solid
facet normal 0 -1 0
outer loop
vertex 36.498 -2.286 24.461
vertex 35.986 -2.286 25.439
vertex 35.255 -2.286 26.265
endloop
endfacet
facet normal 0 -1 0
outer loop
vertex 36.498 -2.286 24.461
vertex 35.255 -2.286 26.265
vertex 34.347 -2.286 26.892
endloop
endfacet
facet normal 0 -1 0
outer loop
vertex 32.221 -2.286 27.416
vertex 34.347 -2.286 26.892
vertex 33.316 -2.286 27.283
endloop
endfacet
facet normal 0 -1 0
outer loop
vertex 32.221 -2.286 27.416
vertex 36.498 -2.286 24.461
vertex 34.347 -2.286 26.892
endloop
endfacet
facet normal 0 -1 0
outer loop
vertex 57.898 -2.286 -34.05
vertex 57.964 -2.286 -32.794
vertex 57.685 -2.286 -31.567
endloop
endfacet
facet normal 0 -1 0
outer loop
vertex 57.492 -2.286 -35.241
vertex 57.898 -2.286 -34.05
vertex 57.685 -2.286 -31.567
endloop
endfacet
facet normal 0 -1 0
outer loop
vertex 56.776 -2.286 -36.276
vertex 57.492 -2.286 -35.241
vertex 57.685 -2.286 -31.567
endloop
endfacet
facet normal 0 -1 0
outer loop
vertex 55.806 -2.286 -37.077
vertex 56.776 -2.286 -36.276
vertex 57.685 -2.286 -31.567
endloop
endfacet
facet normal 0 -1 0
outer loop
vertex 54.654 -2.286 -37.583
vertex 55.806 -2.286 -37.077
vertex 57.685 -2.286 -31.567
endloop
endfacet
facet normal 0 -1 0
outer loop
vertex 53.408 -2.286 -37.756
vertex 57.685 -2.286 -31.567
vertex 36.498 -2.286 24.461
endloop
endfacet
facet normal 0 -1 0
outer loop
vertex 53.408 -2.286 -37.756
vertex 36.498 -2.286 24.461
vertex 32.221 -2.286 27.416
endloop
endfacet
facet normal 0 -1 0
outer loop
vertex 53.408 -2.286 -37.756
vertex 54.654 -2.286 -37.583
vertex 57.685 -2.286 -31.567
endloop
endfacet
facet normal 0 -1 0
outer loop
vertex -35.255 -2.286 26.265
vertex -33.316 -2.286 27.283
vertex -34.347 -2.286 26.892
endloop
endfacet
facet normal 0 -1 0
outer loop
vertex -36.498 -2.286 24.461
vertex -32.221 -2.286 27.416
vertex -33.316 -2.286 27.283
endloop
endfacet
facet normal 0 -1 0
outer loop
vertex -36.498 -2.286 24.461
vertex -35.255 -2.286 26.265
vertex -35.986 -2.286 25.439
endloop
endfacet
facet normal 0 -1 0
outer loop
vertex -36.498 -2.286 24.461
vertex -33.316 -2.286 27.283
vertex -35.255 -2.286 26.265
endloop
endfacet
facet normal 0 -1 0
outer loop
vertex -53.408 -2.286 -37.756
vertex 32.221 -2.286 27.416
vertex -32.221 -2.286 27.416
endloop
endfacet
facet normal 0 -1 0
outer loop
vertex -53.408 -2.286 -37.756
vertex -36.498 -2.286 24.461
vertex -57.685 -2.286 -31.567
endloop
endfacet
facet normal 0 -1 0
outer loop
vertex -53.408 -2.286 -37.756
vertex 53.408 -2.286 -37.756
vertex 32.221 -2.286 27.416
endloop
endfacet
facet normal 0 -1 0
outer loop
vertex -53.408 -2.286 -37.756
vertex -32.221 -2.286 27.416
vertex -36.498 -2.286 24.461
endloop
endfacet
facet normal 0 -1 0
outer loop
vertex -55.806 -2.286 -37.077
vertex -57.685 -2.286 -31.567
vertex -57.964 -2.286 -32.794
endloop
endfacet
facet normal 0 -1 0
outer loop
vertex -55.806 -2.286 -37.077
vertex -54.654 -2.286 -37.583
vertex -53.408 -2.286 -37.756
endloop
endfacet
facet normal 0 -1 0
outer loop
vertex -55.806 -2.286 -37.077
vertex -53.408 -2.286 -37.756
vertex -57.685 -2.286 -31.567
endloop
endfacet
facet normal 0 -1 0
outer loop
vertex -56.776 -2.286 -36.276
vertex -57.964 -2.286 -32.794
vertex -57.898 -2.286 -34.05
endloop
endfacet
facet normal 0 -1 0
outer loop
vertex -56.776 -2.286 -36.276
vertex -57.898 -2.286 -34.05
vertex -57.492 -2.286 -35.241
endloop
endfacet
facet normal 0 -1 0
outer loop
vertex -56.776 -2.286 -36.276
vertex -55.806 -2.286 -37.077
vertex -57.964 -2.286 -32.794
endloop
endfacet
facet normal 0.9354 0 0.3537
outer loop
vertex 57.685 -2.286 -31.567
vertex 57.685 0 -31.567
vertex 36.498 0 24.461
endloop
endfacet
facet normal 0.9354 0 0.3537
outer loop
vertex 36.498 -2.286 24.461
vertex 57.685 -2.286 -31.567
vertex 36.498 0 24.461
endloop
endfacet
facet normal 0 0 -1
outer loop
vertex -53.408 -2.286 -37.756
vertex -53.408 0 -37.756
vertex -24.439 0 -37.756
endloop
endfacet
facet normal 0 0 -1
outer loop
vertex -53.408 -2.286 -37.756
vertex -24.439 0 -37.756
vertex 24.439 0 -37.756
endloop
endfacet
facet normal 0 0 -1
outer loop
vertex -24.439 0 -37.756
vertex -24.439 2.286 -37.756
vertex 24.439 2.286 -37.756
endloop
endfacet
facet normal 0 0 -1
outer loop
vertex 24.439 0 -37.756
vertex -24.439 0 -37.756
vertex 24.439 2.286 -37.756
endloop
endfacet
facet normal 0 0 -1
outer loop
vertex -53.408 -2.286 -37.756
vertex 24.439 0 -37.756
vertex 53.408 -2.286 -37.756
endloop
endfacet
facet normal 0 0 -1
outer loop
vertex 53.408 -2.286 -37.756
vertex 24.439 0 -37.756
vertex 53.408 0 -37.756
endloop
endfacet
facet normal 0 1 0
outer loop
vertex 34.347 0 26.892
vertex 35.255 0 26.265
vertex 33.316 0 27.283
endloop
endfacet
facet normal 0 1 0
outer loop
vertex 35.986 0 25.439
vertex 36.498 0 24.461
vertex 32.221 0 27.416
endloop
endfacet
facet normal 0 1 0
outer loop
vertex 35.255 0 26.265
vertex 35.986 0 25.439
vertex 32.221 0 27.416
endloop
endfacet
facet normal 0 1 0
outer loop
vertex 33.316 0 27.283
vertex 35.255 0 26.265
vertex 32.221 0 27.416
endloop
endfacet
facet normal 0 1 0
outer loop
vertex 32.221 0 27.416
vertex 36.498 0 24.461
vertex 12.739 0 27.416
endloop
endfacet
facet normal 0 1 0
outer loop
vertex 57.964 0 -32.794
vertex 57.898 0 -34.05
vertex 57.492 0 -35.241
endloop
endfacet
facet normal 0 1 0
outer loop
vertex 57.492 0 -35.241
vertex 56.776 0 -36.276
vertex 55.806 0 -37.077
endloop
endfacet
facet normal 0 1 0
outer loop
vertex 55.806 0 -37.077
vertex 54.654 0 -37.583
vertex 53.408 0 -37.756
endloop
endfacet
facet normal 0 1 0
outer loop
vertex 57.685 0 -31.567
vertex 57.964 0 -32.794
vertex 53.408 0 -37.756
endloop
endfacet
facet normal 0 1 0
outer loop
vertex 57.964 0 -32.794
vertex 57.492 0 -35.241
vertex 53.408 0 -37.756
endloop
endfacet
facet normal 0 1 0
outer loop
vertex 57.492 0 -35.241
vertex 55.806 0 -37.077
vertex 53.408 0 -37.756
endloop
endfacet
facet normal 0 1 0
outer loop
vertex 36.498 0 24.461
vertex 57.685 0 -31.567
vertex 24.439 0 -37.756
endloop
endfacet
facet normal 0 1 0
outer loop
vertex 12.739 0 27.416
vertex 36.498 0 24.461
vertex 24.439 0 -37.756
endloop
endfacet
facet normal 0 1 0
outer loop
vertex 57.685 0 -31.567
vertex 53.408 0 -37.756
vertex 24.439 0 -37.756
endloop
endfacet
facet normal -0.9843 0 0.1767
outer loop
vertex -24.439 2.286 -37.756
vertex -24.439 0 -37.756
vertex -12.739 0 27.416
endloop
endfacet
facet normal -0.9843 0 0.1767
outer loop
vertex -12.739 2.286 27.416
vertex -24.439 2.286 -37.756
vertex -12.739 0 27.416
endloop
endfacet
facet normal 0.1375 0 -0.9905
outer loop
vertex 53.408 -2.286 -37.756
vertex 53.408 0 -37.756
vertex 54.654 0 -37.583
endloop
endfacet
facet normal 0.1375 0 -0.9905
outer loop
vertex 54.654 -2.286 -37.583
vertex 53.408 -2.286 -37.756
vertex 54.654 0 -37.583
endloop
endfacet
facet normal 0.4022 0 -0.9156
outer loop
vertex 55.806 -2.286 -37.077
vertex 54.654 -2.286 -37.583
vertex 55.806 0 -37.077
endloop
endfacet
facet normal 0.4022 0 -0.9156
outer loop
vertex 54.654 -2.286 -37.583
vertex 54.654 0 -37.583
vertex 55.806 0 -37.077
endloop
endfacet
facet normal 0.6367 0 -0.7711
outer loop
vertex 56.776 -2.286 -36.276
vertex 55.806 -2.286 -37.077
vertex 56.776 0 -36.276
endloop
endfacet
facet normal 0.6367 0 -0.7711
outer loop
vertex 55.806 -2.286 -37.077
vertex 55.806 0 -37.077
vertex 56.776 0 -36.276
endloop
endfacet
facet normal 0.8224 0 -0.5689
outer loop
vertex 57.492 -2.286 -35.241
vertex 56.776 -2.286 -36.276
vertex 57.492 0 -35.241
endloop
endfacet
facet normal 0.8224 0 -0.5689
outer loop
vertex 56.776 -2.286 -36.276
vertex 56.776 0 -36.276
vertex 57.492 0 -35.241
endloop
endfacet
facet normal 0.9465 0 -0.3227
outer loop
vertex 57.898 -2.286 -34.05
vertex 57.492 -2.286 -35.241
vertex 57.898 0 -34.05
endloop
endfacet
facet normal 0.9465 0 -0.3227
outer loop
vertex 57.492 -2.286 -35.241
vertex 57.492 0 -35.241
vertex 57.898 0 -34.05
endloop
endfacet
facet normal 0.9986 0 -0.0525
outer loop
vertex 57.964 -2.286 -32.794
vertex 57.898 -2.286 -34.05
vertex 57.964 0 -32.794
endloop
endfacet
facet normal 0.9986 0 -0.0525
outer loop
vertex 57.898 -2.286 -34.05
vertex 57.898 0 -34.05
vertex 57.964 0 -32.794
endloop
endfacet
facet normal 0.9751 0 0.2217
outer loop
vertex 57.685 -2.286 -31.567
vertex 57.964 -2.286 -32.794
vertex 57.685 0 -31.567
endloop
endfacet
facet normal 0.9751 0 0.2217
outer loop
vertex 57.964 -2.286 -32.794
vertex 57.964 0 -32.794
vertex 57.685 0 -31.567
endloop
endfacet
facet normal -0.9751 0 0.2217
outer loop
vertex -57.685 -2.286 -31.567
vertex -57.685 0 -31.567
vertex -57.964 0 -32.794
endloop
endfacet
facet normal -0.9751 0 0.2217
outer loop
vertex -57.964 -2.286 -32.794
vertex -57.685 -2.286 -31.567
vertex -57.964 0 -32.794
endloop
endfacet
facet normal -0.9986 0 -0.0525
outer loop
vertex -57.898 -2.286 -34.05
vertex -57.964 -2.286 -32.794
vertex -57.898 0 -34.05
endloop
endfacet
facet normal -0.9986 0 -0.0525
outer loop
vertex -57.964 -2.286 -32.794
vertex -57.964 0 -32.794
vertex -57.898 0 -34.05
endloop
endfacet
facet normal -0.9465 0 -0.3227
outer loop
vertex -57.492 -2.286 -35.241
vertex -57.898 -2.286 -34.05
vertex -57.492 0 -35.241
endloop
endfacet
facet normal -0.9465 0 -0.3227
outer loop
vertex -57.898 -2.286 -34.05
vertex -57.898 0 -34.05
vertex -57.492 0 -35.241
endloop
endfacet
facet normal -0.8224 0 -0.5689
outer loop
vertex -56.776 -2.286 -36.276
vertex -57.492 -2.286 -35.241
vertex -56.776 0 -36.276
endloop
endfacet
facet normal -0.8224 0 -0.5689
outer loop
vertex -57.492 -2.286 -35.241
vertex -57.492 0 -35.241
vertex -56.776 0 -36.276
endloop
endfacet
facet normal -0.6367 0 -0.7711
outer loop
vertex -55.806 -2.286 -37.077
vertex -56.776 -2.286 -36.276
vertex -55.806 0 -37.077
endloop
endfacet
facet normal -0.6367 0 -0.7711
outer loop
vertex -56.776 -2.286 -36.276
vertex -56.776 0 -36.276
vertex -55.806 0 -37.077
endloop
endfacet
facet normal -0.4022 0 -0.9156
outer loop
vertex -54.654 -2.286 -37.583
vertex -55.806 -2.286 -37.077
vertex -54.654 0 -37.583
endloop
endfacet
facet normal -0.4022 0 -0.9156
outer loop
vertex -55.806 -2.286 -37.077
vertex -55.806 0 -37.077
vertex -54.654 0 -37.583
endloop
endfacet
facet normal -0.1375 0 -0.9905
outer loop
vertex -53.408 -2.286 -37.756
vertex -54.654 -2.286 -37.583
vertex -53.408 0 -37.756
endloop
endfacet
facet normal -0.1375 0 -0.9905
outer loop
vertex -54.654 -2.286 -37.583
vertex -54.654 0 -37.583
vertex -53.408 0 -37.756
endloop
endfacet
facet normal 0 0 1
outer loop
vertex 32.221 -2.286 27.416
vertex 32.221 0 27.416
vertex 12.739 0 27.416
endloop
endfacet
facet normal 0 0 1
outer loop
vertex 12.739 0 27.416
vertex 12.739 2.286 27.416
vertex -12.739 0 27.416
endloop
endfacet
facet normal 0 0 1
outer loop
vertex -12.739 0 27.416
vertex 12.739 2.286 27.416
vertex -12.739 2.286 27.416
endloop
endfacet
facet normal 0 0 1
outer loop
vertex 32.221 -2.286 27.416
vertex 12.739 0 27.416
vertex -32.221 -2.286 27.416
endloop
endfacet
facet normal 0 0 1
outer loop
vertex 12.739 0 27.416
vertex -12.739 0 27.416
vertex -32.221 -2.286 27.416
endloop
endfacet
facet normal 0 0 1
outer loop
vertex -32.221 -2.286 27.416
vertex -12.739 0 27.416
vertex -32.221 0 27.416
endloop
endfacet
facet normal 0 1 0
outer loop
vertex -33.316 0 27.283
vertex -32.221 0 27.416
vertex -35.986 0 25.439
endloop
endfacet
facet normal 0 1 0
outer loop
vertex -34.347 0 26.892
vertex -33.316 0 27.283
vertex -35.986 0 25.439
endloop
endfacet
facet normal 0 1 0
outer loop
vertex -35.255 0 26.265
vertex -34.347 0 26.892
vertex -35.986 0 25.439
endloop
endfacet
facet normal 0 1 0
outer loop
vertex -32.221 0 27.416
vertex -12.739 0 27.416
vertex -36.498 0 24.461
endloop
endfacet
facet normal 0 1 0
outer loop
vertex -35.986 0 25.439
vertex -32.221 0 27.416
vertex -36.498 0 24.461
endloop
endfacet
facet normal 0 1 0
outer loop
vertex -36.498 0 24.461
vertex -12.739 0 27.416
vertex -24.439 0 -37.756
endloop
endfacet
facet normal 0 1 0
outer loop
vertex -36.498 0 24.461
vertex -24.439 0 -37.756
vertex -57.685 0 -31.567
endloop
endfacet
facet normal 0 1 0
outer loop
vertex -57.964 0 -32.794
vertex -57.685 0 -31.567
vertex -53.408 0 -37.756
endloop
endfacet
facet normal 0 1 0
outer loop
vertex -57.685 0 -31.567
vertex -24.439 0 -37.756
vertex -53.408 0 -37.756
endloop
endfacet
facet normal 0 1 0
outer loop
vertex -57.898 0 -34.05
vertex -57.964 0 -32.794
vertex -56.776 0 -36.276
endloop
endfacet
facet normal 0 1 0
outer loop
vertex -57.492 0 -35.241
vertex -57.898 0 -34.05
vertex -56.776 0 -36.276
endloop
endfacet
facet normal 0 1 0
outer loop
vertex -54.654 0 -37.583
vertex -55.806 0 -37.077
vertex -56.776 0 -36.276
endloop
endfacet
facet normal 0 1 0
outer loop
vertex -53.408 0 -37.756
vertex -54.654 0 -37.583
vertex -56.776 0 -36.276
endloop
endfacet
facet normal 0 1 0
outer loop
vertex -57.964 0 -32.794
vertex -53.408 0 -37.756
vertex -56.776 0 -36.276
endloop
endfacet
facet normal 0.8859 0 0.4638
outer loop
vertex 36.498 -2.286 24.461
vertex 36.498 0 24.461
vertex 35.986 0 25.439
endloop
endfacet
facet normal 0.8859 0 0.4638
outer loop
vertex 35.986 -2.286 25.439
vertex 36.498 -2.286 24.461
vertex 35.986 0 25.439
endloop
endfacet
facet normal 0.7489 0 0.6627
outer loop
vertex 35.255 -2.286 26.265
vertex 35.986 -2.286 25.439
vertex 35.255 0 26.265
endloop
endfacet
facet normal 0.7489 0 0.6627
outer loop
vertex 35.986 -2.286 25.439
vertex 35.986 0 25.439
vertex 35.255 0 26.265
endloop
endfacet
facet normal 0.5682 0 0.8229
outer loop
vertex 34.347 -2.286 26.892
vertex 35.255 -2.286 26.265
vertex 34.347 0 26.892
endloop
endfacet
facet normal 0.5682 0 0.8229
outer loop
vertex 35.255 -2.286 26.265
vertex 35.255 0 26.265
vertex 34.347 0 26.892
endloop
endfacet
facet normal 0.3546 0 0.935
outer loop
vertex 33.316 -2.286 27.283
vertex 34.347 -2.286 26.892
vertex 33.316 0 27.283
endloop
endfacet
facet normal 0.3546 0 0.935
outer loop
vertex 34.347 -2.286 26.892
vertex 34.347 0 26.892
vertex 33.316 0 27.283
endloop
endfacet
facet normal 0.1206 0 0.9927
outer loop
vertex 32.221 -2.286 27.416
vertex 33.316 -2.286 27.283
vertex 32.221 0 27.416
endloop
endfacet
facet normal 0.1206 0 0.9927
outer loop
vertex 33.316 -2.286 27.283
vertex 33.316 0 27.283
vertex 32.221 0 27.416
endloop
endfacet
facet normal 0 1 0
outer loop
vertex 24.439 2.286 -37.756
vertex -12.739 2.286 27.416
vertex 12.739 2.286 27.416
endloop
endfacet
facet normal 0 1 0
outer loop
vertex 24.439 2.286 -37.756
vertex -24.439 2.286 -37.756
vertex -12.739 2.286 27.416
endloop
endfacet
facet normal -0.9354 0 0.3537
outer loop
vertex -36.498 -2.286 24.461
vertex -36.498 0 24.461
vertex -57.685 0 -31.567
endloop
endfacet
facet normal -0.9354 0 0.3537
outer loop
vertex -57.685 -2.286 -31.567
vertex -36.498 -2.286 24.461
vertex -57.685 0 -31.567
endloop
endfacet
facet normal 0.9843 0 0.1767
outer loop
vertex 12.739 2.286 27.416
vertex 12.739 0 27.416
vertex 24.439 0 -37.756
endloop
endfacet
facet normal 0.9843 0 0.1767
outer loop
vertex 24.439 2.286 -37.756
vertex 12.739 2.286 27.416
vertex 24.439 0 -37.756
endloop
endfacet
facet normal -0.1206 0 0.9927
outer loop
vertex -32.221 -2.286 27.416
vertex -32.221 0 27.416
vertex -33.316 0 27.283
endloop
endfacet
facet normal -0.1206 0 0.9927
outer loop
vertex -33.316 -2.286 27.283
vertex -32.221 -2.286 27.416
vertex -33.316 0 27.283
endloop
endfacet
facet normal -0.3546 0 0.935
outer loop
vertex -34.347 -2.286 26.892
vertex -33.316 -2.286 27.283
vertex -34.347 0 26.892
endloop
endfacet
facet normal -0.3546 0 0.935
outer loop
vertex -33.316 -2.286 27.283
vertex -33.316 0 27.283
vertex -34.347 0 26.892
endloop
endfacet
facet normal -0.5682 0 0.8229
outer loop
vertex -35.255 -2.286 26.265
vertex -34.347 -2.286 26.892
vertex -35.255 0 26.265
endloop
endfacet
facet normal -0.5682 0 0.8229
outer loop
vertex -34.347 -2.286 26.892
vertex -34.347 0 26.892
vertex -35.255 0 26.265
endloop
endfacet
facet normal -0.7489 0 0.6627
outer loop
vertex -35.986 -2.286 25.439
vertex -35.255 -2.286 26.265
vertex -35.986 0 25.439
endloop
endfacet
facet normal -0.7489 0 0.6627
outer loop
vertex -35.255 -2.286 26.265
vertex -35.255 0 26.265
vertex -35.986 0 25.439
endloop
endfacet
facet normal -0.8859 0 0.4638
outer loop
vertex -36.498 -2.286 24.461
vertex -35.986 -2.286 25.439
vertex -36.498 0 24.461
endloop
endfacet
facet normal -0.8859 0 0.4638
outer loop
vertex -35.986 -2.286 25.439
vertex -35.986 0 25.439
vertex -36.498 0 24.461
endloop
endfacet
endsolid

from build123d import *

# Parameters (mm, degrees)
EXTRUDE1_DEPTH = 2.286
EXTRUDE2_DEPTH = 2.286


with BuildPart() as part:
    # Sketch1 → Extrude1 (new body)
    with BuildSketch(Plane(origin=(0, 0, 0), x_dir=(1, 0, 0), z_dir=(0, 1, 0))):
        with BuildLine():
            Line((-53.408275127, 37.75591133), (53.408275127, 37.75591133))
            ThreePointArc((53.408275127, 37.75591133), (57.169709098, 35.782910846), (57.684725289, 31.566766311))
            Line((57.684725289, 31.566766311), (36.497605157, -24.461395817))
            ThreePointArc((36.497605157, -24.461395817), (34.820154512, -26.605684768), (32.221154995, -27.416250797))
            Line((32.221154995, -27.416250797), (-32.221154995, -27.416250797))
            ThreePointArc((-32.221154995, -27.416250797), (-34.820154512, -26.605684768), (-36.497605157, -24.461395817))
            Line((-36.497605157, -24.461395817), (-57.684725289, 31.566766311))
            ThreePointArc((-57.684725289, 31.566766311), (-57.169709098, 35.782910846), (-53.408275127, 37.75591133))
        make_face()
    extrude(amount=-EXTRUDE1_DEPTH)

    # Sketch2 → Extrude2 (add)
    with BuildSketch(Plane(origin=(0, 0, 0), x_dir=(1, 0, 0), z_dir=(0, 1, 0))):
        Polygon((-12.739414216, -27.416250797), (12.739414216, -27.416250797), (24.438876252, 37.75591133), (-24.438876252, 37.75591133), align=None)
    extrude(amount=EXTRUDE2_DEPTH)


solid = part.part
